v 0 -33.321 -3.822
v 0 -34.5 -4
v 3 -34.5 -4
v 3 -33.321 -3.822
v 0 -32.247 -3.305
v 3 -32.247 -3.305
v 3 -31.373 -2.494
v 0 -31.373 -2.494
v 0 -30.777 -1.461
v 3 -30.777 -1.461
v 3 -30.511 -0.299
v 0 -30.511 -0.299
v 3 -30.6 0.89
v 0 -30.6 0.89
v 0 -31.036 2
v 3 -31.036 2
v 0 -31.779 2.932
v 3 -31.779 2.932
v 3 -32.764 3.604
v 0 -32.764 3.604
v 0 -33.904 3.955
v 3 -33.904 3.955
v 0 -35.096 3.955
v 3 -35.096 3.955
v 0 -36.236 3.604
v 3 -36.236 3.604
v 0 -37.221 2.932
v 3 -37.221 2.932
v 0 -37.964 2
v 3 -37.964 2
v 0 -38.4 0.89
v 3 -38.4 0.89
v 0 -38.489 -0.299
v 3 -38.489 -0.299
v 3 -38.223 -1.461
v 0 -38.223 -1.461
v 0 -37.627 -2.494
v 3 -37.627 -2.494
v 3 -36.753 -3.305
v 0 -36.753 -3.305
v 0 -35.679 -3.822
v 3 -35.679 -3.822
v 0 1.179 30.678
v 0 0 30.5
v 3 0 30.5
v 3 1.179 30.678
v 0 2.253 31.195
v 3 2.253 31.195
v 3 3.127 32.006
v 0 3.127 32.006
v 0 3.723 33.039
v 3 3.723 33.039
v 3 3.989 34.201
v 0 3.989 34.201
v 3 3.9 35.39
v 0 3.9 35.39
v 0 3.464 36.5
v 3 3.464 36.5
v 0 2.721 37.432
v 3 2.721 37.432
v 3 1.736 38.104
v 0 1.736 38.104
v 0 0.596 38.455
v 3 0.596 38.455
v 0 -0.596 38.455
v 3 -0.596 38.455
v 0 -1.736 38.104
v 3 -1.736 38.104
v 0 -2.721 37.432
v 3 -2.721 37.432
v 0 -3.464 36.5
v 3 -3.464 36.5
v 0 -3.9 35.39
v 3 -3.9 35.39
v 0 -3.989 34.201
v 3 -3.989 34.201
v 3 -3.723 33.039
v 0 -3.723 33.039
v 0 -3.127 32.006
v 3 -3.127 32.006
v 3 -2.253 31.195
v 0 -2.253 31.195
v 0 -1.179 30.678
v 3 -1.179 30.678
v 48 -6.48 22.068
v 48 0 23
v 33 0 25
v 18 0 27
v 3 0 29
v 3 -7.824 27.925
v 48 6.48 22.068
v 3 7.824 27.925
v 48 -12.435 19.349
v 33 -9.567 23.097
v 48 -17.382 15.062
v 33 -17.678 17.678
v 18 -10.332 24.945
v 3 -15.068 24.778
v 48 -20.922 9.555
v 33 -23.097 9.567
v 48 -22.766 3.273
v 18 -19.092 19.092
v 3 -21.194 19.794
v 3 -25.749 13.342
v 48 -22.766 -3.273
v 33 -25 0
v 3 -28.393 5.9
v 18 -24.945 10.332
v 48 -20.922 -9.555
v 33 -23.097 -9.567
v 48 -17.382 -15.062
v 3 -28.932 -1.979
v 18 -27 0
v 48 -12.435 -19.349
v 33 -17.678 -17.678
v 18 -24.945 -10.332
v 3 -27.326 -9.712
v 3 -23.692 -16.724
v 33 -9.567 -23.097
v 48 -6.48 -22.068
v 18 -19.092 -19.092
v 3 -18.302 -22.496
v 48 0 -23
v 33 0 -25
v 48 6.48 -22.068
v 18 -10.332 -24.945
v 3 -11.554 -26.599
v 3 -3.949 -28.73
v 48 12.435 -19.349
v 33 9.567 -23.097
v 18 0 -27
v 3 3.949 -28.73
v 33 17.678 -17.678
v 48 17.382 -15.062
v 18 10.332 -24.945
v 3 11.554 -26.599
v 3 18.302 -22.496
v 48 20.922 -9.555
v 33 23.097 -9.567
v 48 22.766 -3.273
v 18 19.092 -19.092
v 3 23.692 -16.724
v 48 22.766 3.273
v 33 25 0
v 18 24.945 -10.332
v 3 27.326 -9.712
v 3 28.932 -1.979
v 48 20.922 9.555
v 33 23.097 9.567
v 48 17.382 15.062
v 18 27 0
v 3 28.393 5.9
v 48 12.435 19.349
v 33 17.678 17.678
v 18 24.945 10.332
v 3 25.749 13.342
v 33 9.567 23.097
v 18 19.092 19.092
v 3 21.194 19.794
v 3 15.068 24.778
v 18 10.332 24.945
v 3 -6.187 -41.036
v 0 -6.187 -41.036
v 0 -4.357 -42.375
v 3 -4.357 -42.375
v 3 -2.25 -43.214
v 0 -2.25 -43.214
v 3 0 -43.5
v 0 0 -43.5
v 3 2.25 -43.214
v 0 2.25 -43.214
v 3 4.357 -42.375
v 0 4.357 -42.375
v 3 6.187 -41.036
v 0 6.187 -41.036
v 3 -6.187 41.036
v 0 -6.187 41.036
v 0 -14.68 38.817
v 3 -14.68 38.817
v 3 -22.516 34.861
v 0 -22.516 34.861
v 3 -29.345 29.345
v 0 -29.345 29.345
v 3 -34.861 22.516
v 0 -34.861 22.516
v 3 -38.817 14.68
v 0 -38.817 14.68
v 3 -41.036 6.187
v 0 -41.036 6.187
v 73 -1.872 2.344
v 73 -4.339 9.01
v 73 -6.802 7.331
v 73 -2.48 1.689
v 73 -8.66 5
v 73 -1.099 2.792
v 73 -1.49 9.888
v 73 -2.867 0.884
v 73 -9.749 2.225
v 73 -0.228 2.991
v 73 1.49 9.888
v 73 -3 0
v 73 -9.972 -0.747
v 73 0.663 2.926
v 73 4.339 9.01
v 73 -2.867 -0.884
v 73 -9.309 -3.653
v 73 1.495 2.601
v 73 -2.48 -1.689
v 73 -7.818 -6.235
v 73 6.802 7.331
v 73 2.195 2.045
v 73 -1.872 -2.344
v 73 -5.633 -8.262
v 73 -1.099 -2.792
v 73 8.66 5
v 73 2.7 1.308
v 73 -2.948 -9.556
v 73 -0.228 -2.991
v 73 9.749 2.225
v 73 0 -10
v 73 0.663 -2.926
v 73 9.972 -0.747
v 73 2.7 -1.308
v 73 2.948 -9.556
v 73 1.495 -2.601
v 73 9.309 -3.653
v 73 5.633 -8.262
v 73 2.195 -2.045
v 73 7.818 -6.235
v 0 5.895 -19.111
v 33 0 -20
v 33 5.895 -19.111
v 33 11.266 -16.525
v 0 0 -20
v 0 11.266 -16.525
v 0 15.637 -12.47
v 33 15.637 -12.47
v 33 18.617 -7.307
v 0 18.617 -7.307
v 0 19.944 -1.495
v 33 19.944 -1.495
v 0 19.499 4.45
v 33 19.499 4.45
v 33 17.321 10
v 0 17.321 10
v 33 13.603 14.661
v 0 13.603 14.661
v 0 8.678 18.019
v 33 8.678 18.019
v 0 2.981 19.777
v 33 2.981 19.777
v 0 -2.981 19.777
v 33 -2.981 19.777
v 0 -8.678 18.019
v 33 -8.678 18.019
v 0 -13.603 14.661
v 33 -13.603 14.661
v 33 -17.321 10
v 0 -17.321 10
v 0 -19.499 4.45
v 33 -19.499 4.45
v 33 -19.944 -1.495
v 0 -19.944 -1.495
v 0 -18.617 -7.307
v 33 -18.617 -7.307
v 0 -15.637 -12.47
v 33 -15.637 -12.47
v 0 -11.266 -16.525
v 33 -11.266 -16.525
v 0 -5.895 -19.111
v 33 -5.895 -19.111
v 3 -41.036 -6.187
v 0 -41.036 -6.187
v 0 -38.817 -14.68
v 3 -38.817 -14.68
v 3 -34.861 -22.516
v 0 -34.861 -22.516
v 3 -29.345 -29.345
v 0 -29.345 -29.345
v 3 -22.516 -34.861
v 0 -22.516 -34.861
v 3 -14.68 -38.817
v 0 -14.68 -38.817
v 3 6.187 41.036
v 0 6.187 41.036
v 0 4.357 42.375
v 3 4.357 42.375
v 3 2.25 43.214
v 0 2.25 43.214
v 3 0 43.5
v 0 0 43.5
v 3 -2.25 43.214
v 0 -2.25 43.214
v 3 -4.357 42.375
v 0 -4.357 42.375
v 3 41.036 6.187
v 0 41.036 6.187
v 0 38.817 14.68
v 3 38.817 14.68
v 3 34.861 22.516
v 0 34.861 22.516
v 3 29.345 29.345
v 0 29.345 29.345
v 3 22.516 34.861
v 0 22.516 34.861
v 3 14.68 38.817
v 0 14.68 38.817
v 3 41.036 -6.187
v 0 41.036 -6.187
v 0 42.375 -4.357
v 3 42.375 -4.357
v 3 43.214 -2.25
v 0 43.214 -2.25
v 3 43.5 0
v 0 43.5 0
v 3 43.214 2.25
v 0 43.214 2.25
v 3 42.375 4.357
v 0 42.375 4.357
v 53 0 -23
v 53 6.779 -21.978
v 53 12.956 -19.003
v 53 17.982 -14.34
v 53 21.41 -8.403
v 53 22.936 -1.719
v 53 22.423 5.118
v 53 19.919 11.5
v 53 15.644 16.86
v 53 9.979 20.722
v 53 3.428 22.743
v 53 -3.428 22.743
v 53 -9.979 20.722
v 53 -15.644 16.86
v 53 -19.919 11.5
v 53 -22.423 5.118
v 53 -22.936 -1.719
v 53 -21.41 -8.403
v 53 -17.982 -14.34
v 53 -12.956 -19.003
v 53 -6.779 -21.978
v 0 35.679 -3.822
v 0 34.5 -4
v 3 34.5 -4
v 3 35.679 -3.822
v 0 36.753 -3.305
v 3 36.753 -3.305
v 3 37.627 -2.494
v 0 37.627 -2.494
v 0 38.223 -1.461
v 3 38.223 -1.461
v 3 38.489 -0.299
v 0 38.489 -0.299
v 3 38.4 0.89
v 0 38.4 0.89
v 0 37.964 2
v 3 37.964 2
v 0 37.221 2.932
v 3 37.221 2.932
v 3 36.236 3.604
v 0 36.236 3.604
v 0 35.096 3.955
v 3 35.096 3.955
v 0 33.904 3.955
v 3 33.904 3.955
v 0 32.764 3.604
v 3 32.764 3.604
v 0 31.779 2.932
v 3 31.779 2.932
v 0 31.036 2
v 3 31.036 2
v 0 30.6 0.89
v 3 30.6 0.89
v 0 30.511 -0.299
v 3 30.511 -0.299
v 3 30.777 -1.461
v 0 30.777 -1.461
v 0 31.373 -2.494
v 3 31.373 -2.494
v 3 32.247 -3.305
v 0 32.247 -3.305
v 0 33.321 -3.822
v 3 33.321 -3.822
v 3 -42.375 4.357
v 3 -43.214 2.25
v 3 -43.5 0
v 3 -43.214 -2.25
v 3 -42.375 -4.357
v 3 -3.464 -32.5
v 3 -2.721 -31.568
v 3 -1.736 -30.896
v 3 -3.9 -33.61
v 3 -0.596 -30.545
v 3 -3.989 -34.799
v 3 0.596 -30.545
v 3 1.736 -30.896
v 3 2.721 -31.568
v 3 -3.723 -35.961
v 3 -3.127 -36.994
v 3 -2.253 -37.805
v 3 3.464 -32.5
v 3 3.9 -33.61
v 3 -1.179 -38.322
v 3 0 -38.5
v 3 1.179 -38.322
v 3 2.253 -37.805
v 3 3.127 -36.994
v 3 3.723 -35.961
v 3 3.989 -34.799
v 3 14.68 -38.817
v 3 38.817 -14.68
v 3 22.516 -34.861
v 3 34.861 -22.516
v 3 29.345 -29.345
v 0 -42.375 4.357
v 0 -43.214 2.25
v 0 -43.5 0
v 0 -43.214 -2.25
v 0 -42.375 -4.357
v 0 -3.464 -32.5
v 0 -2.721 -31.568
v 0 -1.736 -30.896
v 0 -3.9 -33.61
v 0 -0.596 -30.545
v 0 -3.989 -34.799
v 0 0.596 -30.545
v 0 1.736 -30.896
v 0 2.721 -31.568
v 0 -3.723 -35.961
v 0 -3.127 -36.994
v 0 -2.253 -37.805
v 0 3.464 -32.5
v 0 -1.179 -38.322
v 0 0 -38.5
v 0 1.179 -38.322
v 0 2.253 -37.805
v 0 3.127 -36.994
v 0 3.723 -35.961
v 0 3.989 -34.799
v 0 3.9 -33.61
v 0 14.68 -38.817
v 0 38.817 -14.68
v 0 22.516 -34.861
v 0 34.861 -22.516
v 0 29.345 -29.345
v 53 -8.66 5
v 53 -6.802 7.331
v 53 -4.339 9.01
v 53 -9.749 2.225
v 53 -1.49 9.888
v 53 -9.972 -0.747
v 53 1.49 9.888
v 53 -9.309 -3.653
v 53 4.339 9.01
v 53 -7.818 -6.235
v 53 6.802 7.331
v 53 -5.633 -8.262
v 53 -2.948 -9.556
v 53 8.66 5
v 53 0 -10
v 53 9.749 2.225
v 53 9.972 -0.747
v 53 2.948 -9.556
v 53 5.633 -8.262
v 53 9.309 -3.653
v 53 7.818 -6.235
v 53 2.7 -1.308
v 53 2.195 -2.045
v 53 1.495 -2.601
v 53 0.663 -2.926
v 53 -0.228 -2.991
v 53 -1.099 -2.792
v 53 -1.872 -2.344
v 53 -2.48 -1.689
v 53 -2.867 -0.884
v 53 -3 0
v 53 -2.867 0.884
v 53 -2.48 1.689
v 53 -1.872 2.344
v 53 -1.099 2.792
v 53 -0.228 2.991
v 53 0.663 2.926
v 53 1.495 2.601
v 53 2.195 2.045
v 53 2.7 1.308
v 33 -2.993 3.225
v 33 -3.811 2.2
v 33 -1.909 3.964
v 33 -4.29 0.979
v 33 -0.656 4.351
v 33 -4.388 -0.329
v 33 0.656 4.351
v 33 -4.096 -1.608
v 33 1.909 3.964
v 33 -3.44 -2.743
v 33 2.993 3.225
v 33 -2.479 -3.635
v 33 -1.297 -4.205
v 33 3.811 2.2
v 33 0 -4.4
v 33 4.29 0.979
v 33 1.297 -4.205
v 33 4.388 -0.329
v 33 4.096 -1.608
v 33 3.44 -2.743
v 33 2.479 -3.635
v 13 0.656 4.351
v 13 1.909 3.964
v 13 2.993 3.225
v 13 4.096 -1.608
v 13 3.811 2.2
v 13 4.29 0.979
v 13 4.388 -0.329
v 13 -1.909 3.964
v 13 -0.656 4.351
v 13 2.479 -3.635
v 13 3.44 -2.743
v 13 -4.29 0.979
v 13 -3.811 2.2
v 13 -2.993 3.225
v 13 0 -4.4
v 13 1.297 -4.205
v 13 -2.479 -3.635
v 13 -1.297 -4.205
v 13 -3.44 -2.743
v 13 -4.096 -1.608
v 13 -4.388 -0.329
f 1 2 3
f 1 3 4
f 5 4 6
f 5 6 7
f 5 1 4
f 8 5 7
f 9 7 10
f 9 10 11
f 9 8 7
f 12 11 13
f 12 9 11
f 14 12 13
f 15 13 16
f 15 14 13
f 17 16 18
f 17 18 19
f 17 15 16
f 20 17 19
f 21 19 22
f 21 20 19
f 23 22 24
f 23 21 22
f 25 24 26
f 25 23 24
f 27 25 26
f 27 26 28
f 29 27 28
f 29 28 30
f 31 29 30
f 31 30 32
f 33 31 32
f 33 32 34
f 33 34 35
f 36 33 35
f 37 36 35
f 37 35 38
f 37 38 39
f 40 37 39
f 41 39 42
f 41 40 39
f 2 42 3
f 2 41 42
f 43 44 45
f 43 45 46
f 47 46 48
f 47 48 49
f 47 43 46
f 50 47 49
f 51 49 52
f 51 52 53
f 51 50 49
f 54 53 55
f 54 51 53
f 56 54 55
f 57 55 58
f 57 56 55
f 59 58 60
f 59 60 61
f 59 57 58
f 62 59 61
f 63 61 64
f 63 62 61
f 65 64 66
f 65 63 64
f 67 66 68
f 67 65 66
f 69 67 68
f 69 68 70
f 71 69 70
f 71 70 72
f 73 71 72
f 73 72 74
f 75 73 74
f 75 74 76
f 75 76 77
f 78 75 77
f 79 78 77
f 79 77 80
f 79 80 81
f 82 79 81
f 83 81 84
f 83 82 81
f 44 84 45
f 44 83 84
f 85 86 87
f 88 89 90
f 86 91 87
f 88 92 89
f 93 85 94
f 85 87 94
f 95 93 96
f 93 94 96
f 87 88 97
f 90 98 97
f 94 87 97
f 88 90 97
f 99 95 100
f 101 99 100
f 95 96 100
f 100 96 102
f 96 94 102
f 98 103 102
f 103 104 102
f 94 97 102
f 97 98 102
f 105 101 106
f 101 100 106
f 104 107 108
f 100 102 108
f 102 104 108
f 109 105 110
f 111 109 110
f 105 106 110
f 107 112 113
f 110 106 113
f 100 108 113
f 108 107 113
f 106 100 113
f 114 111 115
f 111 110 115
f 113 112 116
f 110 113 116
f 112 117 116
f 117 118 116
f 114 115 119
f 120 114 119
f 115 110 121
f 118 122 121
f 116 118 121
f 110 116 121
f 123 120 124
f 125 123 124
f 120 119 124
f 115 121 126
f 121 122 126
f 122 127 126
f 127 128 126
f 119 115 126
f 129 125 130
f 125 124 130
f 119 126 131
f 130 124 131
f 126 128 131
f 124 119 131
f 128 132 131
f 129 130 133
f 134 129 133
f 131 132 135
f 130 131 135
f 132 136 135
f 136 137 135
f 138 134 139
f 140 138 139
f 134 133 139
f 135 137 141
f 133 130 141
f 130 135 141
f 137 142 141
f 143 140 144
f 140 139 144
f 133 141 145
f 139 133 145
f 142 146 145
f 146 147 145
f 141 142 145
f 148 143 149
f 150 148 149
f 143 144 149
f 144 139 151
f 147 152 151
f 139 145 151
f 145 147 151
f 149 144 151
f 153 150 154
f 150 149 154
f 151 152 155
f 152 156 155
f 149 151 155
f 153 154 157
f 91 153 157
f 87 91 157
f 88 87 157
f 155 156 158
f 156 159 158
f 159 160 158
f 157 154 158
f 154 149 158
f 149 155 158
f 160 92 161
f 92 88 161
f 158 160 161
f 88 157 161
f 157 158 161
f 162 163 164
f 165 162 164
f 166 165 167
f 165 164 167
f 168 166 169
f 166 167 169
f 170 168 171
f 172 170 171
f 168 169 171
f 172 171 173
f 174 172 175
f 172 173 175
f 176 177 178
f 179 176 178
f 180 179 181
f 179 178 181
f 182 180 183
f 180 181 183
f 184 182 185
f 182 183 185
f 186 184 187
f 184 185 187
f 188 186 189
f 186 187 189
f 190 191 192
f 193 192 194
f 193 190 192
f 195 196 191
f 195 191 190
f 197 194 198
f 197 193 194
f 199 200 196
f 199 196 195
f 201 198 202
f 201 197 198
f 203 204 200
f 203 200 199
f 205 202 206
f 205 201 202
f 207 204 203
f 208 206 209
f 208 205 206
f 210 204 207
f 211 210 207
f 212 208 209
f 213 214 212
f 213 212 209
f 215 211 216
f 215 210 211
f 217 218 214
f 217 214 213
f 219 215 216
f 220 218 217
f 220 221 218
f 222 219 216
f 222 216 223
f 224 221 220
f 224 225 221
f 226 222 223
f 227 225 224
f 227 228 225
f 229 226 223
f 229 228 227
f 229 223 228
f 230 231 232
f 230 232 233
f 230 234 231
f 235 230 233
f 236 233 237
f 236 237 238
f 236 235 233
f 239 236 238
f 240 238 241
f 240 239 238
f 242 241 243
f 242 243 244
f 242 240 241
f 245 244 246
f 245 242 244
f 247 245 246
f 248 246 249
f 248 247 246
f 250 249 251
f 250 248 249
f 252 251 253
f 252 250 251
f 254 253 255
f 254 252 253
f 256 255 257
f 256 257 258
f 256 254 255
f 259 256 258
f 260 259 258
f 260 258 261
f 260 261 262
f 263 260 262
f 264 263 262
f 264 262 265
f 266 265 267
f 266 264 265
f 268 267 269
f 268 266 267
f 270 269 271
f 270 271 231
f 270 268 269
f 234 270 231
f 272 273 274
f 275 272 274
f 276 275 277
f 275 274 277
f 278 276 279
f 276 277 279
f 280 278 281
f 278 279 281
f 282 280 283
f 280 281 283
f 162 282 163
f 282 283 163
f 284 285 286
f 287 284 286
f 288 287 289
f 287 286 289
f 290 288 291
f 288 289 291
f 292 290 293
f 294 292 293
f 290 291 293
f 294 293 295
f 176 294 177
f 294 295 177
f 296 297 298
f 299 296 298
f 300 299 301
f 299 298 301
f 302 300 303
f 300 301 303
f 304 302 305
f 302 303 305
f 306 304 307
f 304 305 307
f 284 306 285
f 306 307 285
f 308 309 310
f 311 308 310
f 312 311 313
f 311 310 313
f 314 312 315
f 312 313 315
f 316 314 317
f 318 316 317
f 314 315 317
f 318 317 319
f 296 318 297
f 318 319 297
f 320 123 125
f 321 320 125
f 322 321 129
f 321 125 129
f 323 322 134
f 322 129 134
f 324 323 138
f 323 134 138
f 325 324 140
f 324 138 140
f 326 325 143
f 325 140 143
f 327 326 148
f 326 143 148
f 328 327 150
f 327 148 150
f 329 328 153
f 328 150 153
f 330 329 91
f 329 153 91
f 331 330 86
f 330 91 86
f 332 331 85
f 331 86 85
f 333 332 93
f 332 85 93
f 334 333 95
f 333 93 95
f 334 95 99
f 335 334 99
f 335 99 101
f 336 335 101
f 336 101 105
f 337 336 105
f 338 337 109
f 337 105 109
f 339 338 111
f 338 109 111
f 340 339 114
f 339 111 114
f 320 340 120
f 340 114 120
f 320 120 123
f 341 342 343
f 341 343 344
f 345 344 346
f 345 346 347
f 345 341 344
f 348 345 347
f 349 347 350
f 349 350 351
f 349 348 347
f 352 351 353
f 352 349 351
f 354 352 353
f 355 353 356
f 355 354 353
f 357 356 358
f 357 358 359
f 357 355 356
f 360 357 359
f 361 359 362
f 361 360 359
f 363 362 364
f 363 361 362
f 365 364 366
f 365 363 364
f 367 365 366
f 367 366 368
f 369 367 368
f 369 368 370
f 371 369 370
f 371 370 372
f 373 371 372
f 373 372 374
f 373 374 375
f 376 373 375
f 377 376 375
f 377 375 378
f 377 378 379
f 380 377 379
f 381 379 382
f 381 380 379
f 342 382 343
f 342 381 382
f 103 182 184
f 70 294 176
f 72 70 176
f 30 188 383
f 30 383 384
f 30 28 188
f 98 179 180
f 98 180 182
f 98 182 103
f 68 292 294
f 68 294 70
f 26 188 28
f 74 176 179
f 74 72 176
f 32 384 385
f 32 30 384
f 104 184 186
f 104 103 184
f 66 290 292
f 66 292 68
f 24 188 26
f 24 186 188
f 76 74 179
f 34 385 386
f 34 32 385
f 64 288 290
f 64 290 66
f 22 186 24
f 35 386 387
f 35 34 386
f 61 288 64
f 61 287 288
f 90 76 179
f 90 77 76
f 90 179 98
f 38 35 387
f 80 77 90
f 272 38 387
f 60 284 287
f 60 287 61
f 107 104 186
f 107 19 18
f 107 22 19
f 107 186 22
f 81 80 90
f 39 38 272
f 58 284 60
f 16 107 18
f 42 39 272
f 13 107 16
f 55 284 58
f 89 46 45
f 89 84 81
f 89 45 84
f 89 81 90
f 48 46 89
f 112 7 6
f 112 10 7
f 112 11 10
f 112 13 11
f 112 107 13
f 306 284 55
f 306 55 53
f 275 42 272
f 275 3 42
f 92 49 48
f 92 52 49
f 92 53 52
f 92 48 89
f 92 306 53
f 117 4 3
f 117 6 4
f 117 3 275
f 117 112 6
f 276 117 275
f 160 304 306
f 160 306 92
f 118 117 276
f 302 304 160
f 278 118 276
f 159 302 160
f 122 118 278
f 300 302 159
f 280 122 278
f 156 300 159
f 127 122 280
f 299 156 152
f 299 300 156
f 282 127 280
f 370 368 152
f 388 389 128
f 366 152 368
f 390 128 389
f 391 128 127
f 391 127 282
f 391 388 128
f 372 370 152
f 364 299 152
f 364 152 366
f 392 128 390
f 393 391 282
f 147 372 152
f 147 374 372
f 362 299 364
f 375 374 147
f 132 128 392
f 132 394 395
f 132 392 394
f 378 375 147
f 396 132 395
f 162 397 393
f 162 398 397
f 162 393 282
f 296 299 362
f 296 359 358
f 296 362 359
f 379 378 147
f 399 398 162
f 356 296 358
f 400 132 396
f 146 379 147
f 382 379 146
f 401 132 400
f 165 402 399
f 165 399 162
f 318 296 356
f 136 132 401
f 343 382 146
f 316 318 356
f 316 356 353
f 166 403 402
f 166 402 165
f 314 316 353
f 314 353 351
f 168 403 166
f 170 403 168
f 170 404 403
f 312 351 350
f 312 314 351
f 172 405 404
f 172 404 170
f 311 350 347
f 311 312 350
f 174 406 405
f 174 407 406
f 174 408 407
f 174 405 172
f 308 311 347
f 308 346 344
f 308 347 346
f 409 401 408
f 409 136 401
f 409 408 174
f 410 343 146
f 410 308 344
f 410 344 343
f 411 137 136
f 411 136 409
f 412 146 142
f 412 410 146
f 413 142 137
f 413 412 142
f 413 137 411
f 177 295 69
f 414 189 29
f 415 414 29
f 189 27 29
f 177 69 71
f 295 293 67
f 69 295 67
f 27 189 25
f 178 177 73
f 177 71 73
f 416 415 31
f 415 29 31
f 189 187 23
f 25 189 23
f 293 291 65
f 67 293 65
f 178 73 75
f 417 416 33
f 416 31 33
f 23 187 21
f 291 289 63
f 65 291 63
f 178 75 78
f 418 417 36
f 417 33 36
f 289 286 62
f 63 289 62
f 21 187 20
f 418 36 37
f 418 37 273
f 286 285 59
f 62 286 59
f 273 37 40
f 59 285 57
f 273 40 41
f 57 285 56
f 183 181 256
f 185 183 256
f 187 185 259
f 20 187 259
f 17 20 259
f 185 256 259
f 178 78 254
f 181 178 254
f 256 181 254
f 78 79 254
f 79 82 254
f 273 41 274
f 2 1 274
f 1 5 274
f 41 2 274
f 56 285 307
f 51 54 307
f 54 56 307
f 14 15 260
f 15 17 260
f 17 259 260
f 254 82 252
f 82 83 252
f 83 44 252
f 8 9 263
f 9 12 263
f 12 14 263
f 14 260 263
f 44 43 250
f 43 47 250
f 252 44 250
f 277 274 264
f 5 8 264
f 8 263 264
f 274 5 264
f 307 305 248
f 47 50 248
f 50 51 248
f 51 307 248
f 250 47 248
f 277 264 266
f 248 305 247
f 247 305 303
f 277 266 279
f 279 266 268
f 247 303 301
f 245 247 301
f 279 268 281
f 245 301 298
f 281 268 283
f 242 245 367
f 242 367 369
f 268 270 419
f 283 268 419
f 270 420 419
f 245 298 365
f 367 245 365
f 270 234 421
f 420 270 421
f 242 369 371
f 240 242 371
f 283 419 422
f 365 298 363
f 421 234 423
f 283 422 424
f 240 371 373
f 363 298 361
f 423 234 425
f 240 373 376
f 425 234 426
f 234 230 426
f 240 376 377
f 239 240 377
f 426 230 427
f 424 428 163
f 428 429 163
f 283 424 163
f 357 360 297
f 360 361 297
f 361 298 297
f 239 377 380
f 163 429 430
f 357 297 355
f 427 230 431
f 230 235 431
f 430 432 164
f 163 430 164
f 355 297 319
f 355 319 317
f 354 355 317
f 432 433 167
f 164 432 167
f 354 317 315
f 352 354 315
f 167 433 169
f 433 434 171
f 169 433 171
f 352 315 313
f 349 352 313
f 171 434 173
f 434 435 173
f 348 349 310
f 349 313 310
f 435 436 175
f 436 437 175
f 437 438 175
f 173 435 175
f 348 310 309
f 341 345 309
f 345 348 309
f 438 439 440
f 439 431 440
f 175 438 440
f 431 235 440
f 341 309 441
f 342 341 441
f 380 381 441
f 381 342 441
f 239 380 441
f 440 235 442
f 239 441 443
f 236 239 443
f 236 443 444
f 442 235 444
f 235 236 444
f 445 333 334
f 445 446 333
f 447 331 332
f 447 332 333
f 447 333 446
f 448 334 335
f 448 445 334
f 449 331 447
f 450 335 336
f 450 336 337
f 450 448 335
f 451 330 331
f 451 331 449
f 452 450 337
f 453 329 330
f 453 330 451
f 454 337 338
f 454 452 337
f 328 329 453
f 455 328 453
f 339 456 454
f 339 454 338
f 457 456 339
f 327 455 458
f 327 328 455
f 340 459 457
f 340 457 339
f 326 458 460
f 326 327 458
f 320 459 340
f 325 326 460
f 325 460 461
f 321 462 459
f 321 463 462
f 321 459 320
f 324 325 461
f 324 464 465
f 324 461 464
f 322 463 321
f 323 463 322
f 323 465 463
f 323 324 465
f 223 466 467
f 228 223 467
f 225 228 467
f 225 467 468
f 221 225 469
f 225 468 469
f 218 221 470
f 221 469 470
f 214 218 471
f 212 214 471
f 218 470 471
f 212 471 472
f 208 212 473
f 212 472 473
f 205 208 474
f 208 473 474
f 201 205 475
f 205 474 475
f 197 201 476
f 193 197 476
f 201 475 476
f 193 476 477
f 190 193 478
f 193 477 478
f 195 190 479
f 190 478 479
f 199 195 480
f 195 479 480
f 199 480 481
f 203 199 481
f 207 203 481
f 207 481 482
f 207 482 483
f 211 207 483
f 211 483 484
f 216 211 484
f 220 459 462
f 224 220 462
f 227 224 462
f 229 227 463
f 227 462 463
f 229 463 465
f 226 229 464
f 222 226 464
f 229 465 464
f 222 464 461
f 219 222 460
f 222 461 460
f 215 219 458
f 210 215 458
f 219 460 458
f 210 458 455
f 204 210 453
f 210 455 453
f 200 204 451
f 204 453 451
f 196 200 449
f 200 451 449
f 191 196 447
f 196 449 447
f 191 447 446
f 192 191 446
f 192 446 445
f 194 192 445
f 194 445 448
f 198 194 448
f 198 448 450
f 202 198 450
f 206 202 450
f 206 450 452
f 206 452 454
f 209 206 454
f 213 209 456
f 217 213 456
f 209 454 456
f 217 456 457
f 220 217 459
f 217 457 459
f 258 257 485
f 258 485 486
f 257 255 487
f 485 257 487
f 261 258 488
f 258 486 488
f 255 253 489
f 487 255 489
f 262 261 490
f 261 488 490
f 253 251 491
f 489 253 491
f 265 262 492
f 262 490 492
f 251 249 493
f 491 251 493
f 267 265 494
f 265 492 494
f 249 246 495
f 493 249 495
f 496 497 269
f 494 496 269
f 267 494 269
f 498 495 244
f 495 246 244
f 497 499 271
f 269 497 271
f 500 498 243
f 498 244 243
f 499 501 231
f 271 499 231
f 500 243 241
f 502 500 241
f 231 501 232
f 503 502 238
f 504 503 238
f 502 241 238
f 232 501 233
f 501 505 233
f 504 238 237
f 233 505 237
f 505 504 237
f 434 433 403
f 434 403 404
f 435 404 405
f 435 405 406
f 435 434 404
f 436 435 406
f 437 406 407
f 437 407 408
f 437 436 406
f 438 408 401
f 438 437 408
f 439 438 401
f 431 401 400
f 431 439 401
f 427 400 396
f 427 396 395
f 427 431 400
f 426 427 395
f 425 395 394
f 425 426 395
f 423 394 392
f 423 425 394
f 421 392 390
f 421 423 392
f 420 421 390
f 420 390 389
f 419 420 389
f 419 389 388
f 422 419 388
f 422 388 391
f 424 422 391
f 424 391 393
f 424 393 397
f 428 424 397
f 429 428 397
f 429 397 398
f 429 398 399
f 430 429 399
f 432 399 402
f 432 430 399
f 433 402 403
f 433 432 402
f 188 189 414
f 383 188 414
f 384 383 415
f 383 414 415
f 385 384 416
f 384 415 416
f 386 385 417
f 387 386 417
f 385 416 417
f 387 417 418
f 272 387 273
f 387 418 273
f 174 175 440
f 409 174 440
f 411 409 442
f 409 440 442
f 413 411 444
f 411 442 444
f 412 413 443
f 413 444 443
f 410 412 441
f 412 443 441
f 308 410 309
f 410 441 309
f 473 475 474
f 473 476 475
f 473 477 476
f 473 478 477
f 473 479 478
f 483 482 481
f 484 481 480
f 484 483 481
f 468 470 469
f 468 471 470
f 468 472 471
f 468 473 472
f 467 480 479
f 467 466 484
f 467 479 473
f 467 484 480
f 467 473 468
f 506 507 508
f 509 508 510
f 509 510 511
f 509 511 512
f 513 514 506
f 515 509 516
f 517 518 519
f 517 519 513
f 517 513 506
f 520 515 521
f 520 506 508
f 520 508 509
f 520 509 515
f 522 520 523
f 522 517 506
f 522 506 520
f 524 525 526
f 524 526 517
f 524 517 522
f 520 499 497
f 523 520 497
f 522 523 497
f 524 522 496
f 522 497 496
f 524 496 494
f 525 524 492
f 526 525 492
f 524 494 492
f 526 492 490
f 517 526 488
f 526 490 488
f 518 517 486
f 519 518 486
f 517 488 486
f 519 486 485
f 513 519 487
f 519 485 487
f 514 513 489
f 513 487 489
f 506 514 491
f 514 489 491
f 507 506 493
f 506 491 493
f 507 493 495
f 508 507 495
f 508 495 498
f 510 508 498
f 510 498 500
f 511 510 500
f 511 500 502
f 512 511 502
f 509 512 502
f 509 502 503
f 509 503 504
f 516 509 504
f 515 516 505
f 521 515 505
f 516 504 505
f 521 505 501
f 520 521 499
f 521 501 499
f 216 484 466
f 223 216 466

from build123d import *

# Parameters (mm, degrees)
CROQUIS1_R              = 4
CROQUIS1_R_2            = 20
SALIENTE_EXTRUIR1_DEPTH = 3
CROQUIS2_R              = 23
CROQUIS2_R_2            = 20
EXTRUIR_L_MINA2_DEPTH   = 30
CROQUIS3_R              = 23
SALIENTE_EXTRUIR2_DEPTH = 20
CROQUIS4_R              = 4.4
SALIENTE_EXTRUIR3_DEPTH = 20
CROQUIS6_R              = 10
SALIENTE_EXTRUIR4_DEPTH = 20


with BuildPart() as part:
    # Croquis1 → Saliente-Extruir1 (new body)
    with BuildSketch(Plane(origin=(0, 0, 0), x_dir=(0, 0, -1), z_dir=(1, 0, 0))):
        with BuildLine():
            ThreePointArc((6.186895244, 41.036231884), (0, 43.5), (-6.186895244, 41.036231884))
            ThreePointArc((-6.186895244, 41.036231884), (-29.344931419, 29.344931419), (-41.036231884, 6.186895244))
            ThreePointArc((-41.036231884, 6.186895244), (-43.5, 0), (-41.036231884, -6.186895244))
            ThreePointArc((-41.036231884, -6.186895244), (-29.344931419, -29.344931419), (-6.186895244, -41.036231884))
            ThreePointArc((-6.186895244, -41.036231884), (0, -43.5), (6.186895244, -41.036231884))
            ThreePointArc((6.186895244, -41.036231884), (29.344931419, -29.344931419), (41.036231884, -6.186895244))
            ThreePointArc((41.036231884, -6.186895244), (43.5, 0), (41.036231884, 6.186895244))
            ThreePointArc((41.036231884, 6.186895244), (29.344931419, 29.344931419), (6.186895244, 41.036231884))
        make_face()
        with Locations((0, -34.5)):
            Circle(CROQUIS1_R, mode=Mode.SUBTRACT)
        with Locations((-34.5, 0)):
            Circle(CROQUIS1_R, mode=Mode.SUBTRACT)
        Circle(CROQUIS1_R_2, mode=Mode.SUBTRACT)
        with Locations((0, 34.5)):
            Circle(CROQUIS1_R, mode=Mode.SUBTRACT)
        with Locations((34.5, 0)):
            Circle(CROQUIS1_R, mode=Mode.SUBTRACT)
    extrude(amount=SALIENTE_EXTRUIR1_DEPTH)

    # Croquis2 → Extruir-Lámina2 (add)
    with BuildSketch(Plane(origin=(3, 0, 0), x_dir=(0, 0, -1), z_dir=(1, 0, 0))):
        Circle(CROQUIS2_R)
        Circle(CROQUIS2_R_2, mode=Mode.SUBTRACT)
    extrude(amount=EXTRUIR_L_MINA2_DEPTH)

    # Croquis3 → Saliente-Extruir2 (add)
    with BuildSketch(Plane(origin=(33, 0, 0), x_dir=(0, 0, -1), z_dir=(1, 0, 0))):
        Circle(CROQUIS3_R)
    extrude(amount=SALIENTE_EXTRUIR2_DEPTH)

    # Croquis4 → Saliente-Extruir3 (add)
    with BuildSketch(Plane.ZY.offset(-33)):
        with Locations(Location((0, 0, 0), (0, 0, 180))):
            Circle(CROQUIS4_R)
    extrude(amount=SALIENTE_EXTRUIR3_DEPTH)

    # Croquis5 → Revolución1 (revolve)
    with BuildSketch(Plane(origin=(0, 0, 0), x_dir=(1, 0, 0), z_dir=(0, 1, 0))):
        Polygon((48, -23), (3, -29), (3, -23), align=None)
    revolve(axis=Axis((-12.262234232, 0, 0), (1, 0, 0)))

    # Croquis6 → Saliente-Extruir4 (add)
    with BuildSketch(Plane(origin=(53, 0, 0), x_dir=(0, 0, -1), z_dir=(1, 0, 0))):
        Circle(CROQUIS6_R)
        with BuildLine():
            Line((-1.307669683, 2.7), (1.307669683, 2.7))
            ThreePointArc((1.307669683, 2.7), (0, -3), (-1.307669683, 2.7))
        make_face(mode=Mode.SUBTRACT)
    extrude(amount=SALIENTE_EXTRUIR4_DEPTH)


solid = part.part
